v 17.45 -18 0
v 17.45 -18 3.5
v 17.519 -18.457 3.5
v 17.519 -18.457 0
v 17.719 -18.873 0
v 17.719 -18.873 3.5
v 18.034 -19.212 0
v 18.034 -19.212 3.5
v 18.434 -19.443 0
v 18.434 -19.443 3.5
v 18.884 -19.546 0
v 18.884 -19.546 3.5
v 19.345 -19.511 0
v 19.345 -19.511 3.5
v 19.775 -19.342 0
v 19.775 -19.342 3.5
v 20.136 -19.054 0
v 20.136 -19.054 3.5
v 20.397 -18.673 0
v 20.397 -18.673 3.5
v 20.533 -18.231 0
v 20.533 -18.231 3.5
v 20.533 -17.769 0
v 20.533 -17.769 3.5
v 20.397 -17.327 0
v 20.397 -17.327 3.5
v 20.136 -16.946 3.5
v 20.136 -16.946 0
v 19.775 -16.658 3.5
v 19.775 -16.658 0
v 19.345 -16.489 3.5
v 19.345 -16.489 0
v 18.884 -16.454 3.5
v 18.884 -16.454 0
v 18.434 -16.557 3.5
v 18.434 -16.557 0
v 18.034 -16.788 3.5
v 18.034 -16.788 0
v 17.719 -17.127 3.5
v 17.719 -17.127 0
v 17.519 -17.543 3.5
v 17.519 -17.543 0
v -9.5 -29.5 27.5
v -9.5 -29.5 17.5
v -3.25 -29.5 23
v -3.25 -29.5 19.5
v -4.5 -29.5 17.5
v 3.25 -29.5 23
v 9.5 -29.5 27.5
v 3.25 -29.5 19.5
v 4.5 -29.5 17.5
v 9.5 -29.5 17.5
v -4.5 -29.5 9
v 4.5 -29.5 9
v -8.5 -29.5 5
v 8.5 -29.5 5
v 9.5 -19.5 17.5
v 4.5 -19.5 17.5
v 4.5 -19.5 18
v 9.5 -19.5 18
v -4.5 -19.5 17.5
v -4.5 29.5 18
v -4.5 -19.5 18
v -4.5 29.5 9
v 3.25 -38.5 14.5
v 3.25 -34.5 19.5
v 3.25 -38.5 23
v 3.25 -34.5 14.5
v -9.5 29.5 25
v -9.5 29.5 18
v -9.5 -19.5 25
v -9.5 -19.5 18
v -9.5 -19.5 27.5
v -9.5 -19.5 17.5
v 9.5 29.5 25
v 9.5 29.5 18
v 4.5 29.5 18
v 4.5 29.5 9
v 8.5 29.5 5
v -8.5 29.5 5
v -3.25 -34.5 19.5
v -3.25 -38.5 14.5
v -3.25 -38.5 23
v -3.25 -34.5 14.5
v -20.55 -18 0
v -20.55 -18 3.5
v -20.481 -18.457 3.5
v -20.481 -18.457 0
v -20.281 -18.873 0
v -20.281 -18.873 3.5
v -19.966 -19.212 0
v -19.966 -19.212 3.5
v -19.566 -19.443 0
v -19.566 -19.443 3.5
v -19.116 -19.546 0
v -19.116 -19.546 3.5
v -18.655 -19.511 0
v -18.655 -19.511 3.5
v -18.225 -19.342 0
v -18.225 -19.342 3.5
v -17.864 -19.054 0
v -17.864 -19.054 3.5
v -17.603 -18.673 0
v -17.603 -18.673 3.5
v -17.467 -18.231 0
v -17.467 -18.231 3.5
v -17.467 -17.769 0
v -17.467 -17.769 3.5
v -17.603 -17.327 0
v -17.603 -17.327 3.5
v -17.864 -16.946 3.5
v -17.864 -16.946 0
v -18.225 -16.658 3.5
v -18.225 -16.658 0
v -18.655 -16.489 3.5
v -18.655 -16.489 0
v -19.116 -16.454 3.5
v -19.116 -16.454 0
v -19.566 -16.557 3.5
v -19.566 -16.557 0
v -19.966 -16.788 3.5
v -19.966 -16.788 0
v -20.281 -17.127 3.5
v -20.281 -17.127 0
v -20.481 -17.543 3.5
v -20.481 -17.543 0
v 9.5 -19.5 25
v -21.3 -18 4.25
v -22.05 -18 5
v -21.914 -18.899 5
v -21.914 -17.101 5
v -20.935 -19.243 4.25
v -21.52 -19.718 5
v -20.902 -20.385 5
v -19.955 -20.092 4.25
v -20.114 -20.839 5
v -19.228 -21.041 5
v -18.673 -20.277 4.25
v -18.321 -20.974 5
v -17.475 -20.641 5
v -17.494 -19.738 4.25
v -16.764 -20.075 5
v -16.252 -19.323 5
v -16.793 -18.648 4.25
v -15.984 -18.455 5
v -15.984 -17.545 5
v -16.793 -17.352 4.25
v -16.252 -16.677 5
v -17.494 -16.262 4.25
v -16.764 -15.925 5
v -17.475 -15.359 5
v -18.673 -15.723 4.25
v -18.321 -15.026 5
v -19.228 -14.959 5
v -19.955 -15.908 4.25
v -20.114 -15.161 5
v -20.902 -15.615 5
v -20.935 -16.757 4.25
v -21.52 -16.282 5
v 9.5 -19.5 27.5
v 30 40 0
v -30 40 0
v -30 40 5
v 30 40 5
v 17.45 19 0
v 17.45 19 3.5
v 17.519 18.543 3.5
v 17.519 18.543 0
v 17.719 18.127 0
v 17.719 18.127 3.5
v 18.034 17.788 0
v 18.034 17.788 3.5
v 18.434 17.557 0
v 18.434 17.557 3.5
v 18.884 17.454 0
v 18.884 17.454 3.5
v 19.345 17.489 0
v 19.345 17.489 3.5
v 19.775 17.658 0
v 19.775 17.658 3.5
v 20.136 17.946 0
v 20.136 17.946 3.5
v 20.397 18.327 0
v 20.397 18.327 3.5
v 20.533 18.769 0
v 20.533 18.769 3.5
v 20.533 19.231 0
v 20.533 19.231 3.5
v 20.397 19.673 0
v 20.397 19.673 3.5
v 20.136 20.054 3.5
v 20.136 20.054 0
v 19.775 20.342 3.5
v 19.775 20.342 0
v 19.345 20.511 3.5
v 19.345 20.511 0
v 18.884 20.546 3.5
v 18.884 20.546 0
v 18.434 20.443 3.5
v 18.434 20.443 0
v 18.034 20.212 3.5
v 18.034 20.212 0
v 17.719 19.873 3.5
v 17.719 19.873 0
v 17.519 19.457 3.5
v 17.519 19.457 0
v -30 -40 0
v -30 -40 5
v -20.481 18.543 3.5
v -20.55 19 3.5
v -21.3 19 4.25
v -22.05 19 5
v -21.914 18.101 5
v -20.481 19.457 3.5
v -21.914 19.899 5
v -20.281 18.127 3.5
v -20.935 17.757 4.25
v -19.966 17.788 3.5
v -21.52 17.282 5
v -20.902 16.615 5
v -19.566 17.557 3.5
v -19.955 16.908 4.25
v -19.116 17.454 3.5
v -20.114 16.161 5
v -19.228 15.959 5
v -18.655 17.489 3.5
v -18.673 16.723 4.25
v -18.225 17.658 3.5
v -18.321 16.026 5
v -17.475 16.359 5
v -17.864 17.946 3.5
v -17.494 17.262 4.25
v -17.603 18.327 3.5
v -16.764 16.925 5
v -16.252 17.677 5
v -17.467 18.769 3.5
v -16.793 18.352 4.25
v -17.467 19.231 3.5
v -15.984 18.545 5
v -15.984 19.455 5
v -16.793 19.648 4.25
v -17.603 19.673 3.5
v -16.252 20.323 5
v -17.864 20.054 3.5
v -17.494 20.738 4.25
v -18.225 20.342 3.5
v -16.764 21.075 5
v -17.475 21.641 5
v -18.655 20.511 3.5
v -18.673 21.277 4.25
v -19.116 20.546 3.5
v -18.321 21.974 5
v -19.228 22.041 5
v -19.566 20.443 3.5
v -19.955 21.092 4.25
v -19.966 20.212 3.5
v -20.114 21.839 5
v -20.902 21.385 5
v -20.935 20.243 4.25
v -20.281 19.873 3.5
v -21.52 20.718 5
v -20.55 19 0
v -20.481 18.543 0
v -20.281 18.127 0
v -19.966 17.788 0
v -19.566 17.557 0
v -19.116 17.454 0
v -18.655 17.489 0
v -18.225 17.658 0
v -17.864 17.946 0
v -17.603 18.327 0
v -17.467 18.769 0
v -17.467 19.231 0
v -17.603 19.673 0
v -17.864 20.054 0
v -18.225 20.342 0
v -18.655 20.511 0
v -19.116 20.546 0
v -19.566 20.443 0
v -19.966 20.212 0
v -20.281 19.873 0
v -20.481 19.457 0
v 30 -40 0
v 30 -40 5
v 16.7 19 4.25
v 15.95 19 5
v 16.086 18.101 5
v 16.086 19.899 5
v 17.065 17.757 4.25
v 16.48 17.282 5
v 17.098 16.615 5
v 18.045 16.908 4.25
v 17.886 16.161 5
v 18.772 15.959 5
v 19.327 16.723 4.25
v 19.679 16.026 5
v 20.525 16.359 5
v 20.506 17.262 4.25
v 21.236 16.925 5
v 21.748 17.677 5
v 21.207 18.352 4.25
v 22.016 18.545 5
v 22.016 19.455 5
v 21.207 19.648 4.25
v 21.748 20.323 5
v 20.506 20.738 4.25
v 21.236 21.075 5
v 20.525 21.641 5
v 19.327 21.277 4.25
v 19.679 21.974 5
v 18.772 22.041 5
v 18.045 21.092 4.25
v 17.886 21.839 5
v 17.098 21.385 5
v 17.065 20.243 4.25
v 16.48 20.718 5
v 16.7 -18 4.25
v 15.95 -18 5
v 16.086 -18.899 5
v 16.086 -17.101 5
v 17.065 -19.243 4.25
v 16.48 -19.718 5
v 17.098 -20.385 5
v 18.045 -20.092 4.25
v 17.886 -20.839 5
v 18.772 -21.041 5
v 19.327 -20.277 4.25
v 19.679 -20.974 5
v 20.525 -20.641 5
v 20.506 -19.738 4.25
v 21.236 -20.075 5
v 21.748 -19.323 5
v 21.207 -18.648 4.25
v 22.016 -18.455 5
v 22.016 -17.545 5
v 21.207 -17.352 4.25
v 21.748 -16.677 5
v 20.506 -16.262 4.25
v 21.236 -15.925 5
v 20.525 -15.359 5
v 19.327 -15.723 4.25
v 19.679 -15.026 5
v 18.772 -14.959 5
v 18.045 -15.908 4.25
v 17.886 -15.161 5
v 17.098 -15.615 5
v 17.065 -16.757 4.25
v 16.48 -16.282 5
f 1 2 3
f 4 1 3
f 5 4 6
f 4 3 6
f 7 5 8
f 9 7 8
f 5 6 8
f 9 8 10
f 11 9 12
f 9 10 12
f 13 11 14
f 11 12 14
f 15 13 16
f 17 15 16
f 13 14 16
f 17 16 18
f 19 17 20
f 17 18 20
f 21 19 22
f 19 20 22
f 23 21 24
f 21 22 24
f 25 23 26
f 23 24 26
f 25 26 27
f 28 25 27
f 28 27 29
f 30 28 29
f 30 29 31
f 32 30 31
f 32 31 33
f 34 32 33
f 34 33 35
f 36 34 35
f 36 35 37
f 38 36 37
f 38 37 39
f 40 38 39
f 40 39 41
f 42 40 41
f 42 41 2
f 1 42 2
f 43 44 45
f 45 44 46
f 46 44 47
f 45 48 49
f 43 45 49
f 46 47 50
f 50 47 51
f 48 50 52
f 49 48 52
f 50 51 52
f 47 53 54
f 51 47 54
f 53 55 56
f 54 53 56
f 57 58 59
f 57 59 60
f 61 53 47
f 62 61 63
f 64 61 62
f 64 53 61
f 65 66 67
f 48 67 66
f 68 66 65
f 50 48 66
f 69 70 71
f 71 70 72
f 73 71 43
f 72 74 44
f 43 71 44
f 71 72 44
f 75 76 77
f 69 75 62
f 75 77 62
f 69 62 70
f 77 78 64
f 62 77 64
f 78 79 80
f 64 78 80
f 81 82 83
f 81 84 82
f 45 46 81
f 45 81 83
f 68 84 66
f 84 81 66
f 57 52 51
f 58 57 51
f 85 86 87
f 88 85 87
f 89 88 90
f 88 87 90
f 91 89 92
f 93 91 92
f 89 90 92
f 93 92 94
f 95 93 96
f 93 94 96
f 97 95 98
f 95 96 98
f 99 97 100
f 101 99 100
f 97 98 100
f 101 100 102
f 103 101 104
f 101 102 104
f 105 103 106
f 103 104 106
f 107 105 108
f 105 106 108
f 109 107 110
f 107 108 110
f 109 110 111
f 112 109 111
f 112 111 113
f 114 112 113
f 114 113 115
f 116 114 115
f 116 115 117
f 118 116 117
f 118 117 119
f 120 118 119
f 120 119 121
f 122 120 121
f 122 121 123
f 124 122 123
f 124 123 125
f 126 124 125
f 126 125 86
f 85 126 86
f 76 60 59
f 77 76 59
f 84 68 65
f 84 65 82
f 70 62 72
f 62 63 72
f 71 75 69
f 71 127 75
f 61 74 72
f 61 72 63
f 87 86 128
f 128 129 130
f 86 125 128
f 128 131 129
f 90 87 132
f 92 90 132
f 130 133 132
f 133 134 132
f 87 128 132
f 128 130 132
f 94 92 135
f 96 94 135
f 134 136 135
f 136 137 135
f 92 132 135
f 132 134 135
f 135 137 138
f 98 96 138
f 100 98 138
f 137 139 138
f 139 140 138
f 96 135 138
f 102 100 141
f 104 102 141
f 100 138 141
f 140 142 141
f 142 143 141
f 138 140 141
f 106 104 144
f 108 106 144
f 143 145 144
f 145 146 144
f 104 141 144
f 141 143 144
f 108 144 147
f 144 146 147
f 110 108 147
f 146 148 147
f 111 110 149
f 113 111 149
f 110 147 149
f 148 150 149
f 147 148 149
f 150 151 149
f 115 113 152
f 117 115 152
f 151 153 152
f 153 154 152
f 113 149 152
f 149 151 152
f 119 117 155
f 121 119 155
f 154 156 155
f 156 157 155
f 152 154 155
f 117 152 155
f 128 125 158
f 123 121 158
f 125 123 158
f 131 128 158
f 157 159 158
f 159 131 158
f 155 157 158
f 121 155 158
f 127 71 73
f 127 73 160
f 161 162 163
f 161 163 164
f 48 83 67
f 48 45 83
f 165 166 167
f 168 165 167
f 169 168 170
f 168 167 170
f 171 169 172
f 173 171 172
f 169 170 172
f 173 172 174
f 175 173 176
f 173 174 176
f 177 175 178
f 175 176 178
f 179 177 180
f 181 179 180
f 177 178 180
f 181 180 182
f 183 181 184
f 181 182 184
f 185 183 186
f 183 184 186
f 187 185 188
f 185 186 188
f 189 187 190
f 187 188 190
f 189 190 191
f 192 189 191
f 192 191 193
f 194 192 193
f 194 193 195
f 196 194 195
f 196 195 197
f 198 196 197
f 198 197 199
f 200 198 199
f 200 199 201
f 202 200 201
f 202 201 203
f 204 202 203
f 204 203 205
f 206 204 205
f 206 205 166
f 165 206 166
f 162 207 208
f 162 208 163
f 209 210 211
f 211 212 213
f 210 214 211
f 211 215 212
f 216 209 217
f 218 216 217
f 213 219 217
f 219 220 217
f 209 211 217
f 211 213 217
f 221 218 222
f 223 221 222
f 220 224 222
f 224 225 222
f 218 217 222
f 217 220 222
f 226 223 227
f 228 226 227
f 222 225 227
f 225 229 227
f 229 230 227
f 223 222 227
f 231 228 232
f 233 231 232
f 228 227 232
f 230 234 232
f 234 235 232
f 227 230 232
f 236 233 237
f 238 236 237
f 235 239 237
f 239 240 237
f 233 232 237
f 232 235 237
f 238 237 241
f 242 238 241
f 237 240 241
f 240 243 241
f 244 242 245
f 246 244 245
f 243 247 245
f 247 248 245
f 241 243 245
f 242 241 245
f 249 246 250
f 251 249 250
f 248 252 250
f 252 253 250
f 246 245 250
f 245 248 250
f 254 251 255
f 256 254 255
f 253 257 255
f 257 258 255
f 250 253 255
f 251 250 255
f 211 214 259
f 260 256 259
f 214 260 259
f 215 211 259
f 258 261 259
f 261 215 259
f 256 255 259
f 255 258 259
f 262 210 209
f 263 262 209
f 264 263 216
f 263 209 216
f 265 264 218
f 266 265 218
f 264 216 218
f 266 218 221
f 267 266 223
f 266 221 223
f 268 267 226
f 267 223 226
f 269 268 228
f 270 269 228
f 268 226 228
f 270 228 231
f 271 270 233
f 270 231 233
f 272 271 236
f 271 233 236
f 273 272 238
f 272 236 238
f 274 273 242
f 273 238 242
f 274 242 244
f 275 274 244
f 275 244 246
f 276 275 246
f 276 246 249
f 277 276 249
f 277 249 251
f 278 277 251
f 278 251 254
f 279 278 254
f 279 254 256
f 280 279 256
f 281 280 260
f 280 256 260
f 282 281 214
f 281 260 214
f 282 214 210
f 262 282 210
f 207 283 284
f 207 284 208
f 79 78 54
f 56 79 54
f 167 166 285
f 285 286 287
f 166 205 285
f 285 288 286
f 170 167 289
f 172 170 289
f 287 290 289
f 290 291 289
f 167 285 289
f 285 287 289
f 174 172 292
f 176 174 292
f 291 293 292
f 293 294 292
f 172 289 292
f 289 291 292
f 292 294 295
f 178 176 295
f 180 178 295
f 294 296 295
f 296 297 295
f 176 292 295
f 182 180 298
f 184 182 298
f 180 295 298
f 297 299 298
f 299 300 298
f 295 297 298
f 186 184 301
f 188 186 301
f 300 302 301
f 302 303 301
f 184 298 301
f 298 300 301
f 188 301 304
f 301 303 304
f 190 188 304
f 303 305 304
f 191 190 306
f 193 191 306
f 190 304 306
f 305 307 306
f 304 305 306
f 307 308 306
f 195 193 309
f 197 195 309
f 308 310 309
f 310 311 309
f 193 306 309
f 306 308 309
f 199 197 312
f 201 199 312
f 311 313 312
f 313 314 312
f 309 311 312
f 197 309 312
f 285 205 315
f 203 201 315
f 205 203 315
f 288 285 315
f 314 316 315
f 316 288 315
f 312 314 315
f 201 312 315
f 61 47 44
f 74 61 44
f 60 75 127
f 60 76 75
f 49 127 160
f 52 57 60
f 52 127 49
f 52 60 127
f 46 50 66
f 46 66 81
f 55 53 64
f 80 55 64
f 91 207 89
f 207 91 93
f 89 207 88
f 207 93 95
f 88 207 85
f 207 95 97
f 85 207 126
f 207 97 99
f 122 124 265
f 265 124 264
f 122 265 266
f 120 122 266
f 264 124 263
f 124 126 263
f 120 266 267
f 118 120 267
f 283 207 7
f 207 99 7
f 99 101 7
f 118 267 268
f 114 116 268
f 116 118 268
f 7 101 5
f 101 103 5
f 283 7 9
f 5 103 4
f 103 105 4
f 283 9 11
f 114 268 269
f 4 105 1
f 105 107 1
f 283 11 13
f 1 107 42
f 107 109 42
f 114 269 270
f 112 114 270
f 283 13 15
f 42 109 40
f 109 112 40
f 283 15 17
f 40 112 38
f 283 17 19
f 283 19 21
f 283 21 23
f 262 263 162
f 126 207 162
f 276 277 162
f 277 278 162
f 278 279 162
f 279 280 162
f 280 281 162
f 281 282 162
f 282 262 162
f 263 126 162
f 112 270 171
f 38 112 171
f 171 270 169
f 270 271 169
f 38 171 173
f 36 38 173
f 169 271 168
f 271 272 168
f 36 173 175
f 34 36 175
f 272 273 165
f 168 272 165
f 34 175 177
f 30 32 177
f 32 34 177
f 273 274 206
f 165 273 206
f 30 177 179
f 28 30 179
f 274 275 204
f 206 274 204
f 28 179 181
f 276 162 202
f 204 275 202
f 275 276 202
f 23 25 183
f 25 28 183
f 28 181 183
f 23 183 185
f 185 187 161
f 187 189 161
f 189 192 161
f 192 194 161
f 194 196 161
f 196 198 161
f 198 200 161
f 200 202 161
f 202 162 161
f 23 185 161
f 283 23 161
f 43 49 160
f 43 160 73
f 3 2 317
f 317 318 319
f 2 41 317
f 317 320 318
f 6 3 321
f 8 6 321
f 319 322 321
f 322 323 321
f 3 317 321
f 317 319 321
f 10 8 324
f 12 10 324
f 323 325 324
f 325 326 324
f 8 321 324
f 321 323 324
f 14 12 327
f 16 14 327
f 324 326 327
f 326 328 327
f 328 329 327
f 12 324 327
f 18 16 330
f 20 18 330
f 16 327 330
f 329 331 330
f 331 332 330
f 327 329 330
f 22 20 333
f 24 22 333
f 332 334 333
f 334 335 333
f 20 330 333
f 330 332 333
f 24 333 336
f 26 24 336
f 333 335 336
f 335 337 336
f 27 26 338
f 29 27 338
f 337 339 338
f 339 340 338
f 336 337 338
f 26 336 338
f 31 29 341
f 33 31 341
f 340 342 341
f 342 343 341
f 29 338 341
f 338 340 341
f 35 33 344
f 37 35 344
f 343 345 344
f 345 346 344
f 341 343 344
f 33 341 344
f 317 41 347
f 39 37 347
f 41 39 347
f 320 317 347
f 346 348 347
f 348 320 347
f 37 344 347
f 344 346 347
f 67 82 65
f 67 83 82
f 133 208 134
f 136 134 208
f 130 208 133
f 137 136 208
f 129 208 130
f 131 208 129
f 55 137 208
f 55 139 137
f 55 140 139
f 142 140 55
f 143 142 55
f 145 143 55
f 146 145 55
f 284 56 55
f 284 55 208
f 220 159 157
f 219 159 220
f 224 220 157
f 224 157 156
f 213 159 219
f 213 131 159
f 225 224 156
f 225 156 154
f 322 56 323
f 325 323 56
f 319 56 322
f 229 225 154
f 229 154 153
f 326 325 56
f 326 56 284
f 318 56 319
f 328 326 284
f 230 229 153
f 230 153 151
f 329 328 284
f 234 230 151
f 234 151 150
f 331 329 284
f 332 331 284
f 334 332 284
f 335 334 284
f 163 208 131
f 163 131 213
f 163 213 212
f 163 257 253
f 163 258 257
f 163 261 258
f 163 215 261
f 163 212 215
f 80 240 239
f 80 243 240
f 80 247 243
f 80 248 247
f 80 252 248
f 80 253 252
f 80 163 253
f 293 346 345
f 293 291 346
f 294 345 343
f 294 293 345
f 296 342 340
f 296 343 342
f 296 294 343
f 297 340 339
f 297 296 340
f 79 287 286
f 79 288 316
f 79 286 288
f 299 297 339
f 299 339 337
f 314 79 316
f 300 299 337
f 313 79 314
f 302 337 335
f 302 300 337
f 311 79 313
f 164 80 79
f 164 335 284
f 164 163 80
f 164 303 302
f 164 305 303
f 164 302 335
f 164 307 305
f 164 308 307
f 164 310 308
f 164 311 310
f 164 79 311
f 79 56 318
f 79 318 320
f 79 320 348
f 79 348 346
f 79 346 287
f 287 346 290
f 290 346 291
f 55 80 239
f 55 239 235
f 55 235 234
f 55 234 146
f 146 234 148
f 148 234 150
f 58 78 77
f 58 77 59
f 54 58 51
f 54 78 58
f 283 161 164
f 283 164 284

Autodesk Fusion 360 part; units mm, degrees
sketch "Esquisse1" plane through (0, 0, 0) normal (0, 0, 1) x (1, 0, 0)
  line L0 (-30, 40) -> (30, 40)
  line L1 (30, 40) -> (30, -40)
  line L2 (30, -40) -> (-30, -40)
  line L3 (-30, -40) -> (-30, 40)
  line L4 (-30, 40) -> (30, -40) construction
  line L5 (30, 40) -> (-30, -40) construction
  dimension "d1" = 60
  dimension "d2" = 80
extrude "Extrusion1" add sketch "Esquisse1" along normal blind 5
sketch "Esquisse2" plane through (0, 0, 5) normal (0, 0, 1) x (-1, 0, 0)
  line L0 (30, 40) -> (-30, 40)
  line L1 (-30, 40) -> (-30, -40)
  line L2 (-30, -40) -> (30, -40)
  line L3 (30, -40) -> (30, 40)
  line L4 (4.5, -29.5) -> (-4.5, -29.5)
  line L5 (-4.5, -29.5) -> (-4.5, 29.5)
  line L6 (-4.5, 29.5) -> (4.5, 29.5)
  line L7 (4.5, 29.5) -> (4.5, -29.5)
  line L8 (4.5, -29.5) -> (-4.5, 29.5) construction
  line L9 (-4.5, -29.5) -> (4.5, 29.5) construction
  dimension "d5" = 59
  dimension "d6" = 9
extrude "Extrusion2" add sketch "Esquisse2" along normal blind 17 contours L4 L5 L6 L7
sketch "Esquisse3" plane through (0, 0, 22) normal (0, 0, 1) x (-1, 0, 0)
  line L0 (4.5, 29.5) -> (-4.5, 29.5)
  line L1 (-4.5, 29.5) -> (-4.5, -29.5)
  line L2 (-4.5, -29.5) -> (4.5, -29.5)
  line L3 (4.5, -29.5) -> (4.5, 29.5)
  line L4 (9.5, -29.5) -> (-9.5, -29.5)
  line L5 (-9.5, -29.5) -> (-9.5, 29.5)
  line L6 (-9.5, 29.5) -> (9.5, 29.5)
  line L7 (9.5, 29.5) -> (9.5, -29.5)
  line L8 (9.5, -29.5) -> (-9.5, 29.5) construction
  line L9 (-9.5, -29.5) -> (9.5, 29.5) construction
  dimension "d9" = 59
  dimension "d10" = 19
extrude "Extrusion3" add sketch "Esquisse3" along normal blind 3
sketch "Esquisse4" plane through (0, 0, 25) normal (0, 0, 1) x (-1, 0, 0)
  line L0 (9.5, 29.5) -> (-9.5, 29.5)
  line L1 (-9.5, 29.5) -> (-9.5, -29.5)
  line L2 (-9.5, -29.5) -> (9.5, -29.5)
  line L3 (9.5, -29.5) -> (9.5, 29.5)
  line L4 (-9.5, 29.5) -> (9.5, 29.5)
  line L5 (9.5, 29.5) -> (9.5, 19.5)
  line L6 (9.5, 19.5) -> (-9.5, 19.5)
  line L7 (-9.5, 19.5) -> (-9.5, 29.5)
  dimension "d13" = 10
extrude "Extrusion4" add sketch "Esquisse4" along normal blind 10 from surface at -7.5 contours L0 L1 L3 L4 L5 L6 L7
chamfer "Chanfrein5" distance 4 angle 45 1 edges at (4.5, 0, 5)
chamfer "Chanfrein6" distance 4 angle 45 1 edges at (-4.5, 0, 5)
sketch "Esquisse10" plane through (0, -29.5, 0) normal (0, -1, 0) x (1, 0, 0)
  line L0 (9.5, 17.5) -> (9.5, 27.5)
  line L1 (-9.5, 27.5) -> (-9.5, 17.5)
  line L2 (-4.5, 17.5) -> (-4.5, 9)
  line L3 (-4.5, 9) -> (-8.5, 5)
  line L4 (-8.5, 5) -> (8.5, 5)
  line L5 (8.5, 5) -> (4.5, 9)
  line L6 (4.5, 9) -> (4.5, 17.5)
  line L7 (0, 25) -> (0, 23)
  line L8 (0, 23) -> (-3.25, 23)
  line L9 (-3.25, 23) -> (3.25, 23)
  line L10 (3.25, 23) -> (3.25, 14.5)
  line L11 (3.25, 14.5) -> (-3.25, 14.5)
  line L12 (-3.25, 14.5) -> (-3.25, 23)
  line L13 (-3.25, 23) -> (3.25, 23)
  line L14 (3.25, 23) -> (3.25, 19.5)
  line L15 (3.25, 19.5) -> (-3.25, 19.5)
  line L16 (-3.25, 19.5) -> (-3.25, 23)
  line L17 (4.5, 17.5) -> (9.5, 17.5)
  line L18 (9.5, 27.5) -> (-9.5, 27.5)
  line L19 (-9.5, 27.5) -> (9.5, 27.5)
  line L20 (-9.5, 17.5) -> (-4.5, 17.5)
  point P0 (0, 25)
  point P1 (0, 23)
  dimension "d33" = 6.5
  dimension "d34" = 3.5
  dimension "d35" = 8.5
  dimension "d46" = 4.5
extrude "Extrusion9" add sketch "Esquisse10" along normal blind 6 contours L8 L9 L10 L12 L13 L14 L15 L16
extrude "Extrusion10" add sketch "Esquisse10" along normal blind 4 from surface at 5 contours L8 L9 L10 L12 L13 L14 L15 L16 | L10 L11 L12 L15
extrude "Extrusion11" add 2 faces at (7.8333, 13.1667, 22) (-7.8333, 13.1667, 22) along direction (0, 0, -1) blind 4
sketch "Esquisse11" plane through (0, 0, 5) normal (0, 0, 1) x (-1, 0, 0)
  line L0 (8.5, -29.5) -> (-8.5, -29.5)
  line L1 (-8.5, -29.5) -> (-8.5, 29.5)
  line L2 (-8.5, 29.5) -> (8.5, 29.5)
  line L3 (8.5, 29.5) -> (8.5, -29.5)
  line L4 (30, 40) -> (-30, 40)
  line L5 (-30, 40) -> (-30, -40)
  line L6 (-30, -40) -> (30, -40)
  line L7 (30, -40) -> (30, 40)
  circle A0 centre (19, -19) radius 1.55
  circle A1 centre (19, 18) radius 1.55
  circle A2 centre (-19, -19) radius 1.55
  circle A3 centre (-19, 18) radius 1.55
  dimension "d47" = 3.1
  dimension "d48" = 3.1
  dimension "d49" = 3.1
  dimension "d50" = 3.1
  dimension "d51" = 37
  dimension "d52" = 37
  dimension "d53" = 11
  dimension "d54" = 11
  dimension "d55" = 11
  dimension "d56" = 11
  dimension "d57" = 22
  dimension "d58" = 22
extrude "Extrusion12" cut sketch "Esquisse11" against normal blind 10 contours A0 | A1 | A2 | A3
chamfer "Chanfrein7" distance 1.5 angle 45 4 edges at (-17.5549, 18.4395, 5) (-17.5549, -18.5605, 5) (20.4451, 18.4395, 5) (20.4451, -18.5605, 5)
